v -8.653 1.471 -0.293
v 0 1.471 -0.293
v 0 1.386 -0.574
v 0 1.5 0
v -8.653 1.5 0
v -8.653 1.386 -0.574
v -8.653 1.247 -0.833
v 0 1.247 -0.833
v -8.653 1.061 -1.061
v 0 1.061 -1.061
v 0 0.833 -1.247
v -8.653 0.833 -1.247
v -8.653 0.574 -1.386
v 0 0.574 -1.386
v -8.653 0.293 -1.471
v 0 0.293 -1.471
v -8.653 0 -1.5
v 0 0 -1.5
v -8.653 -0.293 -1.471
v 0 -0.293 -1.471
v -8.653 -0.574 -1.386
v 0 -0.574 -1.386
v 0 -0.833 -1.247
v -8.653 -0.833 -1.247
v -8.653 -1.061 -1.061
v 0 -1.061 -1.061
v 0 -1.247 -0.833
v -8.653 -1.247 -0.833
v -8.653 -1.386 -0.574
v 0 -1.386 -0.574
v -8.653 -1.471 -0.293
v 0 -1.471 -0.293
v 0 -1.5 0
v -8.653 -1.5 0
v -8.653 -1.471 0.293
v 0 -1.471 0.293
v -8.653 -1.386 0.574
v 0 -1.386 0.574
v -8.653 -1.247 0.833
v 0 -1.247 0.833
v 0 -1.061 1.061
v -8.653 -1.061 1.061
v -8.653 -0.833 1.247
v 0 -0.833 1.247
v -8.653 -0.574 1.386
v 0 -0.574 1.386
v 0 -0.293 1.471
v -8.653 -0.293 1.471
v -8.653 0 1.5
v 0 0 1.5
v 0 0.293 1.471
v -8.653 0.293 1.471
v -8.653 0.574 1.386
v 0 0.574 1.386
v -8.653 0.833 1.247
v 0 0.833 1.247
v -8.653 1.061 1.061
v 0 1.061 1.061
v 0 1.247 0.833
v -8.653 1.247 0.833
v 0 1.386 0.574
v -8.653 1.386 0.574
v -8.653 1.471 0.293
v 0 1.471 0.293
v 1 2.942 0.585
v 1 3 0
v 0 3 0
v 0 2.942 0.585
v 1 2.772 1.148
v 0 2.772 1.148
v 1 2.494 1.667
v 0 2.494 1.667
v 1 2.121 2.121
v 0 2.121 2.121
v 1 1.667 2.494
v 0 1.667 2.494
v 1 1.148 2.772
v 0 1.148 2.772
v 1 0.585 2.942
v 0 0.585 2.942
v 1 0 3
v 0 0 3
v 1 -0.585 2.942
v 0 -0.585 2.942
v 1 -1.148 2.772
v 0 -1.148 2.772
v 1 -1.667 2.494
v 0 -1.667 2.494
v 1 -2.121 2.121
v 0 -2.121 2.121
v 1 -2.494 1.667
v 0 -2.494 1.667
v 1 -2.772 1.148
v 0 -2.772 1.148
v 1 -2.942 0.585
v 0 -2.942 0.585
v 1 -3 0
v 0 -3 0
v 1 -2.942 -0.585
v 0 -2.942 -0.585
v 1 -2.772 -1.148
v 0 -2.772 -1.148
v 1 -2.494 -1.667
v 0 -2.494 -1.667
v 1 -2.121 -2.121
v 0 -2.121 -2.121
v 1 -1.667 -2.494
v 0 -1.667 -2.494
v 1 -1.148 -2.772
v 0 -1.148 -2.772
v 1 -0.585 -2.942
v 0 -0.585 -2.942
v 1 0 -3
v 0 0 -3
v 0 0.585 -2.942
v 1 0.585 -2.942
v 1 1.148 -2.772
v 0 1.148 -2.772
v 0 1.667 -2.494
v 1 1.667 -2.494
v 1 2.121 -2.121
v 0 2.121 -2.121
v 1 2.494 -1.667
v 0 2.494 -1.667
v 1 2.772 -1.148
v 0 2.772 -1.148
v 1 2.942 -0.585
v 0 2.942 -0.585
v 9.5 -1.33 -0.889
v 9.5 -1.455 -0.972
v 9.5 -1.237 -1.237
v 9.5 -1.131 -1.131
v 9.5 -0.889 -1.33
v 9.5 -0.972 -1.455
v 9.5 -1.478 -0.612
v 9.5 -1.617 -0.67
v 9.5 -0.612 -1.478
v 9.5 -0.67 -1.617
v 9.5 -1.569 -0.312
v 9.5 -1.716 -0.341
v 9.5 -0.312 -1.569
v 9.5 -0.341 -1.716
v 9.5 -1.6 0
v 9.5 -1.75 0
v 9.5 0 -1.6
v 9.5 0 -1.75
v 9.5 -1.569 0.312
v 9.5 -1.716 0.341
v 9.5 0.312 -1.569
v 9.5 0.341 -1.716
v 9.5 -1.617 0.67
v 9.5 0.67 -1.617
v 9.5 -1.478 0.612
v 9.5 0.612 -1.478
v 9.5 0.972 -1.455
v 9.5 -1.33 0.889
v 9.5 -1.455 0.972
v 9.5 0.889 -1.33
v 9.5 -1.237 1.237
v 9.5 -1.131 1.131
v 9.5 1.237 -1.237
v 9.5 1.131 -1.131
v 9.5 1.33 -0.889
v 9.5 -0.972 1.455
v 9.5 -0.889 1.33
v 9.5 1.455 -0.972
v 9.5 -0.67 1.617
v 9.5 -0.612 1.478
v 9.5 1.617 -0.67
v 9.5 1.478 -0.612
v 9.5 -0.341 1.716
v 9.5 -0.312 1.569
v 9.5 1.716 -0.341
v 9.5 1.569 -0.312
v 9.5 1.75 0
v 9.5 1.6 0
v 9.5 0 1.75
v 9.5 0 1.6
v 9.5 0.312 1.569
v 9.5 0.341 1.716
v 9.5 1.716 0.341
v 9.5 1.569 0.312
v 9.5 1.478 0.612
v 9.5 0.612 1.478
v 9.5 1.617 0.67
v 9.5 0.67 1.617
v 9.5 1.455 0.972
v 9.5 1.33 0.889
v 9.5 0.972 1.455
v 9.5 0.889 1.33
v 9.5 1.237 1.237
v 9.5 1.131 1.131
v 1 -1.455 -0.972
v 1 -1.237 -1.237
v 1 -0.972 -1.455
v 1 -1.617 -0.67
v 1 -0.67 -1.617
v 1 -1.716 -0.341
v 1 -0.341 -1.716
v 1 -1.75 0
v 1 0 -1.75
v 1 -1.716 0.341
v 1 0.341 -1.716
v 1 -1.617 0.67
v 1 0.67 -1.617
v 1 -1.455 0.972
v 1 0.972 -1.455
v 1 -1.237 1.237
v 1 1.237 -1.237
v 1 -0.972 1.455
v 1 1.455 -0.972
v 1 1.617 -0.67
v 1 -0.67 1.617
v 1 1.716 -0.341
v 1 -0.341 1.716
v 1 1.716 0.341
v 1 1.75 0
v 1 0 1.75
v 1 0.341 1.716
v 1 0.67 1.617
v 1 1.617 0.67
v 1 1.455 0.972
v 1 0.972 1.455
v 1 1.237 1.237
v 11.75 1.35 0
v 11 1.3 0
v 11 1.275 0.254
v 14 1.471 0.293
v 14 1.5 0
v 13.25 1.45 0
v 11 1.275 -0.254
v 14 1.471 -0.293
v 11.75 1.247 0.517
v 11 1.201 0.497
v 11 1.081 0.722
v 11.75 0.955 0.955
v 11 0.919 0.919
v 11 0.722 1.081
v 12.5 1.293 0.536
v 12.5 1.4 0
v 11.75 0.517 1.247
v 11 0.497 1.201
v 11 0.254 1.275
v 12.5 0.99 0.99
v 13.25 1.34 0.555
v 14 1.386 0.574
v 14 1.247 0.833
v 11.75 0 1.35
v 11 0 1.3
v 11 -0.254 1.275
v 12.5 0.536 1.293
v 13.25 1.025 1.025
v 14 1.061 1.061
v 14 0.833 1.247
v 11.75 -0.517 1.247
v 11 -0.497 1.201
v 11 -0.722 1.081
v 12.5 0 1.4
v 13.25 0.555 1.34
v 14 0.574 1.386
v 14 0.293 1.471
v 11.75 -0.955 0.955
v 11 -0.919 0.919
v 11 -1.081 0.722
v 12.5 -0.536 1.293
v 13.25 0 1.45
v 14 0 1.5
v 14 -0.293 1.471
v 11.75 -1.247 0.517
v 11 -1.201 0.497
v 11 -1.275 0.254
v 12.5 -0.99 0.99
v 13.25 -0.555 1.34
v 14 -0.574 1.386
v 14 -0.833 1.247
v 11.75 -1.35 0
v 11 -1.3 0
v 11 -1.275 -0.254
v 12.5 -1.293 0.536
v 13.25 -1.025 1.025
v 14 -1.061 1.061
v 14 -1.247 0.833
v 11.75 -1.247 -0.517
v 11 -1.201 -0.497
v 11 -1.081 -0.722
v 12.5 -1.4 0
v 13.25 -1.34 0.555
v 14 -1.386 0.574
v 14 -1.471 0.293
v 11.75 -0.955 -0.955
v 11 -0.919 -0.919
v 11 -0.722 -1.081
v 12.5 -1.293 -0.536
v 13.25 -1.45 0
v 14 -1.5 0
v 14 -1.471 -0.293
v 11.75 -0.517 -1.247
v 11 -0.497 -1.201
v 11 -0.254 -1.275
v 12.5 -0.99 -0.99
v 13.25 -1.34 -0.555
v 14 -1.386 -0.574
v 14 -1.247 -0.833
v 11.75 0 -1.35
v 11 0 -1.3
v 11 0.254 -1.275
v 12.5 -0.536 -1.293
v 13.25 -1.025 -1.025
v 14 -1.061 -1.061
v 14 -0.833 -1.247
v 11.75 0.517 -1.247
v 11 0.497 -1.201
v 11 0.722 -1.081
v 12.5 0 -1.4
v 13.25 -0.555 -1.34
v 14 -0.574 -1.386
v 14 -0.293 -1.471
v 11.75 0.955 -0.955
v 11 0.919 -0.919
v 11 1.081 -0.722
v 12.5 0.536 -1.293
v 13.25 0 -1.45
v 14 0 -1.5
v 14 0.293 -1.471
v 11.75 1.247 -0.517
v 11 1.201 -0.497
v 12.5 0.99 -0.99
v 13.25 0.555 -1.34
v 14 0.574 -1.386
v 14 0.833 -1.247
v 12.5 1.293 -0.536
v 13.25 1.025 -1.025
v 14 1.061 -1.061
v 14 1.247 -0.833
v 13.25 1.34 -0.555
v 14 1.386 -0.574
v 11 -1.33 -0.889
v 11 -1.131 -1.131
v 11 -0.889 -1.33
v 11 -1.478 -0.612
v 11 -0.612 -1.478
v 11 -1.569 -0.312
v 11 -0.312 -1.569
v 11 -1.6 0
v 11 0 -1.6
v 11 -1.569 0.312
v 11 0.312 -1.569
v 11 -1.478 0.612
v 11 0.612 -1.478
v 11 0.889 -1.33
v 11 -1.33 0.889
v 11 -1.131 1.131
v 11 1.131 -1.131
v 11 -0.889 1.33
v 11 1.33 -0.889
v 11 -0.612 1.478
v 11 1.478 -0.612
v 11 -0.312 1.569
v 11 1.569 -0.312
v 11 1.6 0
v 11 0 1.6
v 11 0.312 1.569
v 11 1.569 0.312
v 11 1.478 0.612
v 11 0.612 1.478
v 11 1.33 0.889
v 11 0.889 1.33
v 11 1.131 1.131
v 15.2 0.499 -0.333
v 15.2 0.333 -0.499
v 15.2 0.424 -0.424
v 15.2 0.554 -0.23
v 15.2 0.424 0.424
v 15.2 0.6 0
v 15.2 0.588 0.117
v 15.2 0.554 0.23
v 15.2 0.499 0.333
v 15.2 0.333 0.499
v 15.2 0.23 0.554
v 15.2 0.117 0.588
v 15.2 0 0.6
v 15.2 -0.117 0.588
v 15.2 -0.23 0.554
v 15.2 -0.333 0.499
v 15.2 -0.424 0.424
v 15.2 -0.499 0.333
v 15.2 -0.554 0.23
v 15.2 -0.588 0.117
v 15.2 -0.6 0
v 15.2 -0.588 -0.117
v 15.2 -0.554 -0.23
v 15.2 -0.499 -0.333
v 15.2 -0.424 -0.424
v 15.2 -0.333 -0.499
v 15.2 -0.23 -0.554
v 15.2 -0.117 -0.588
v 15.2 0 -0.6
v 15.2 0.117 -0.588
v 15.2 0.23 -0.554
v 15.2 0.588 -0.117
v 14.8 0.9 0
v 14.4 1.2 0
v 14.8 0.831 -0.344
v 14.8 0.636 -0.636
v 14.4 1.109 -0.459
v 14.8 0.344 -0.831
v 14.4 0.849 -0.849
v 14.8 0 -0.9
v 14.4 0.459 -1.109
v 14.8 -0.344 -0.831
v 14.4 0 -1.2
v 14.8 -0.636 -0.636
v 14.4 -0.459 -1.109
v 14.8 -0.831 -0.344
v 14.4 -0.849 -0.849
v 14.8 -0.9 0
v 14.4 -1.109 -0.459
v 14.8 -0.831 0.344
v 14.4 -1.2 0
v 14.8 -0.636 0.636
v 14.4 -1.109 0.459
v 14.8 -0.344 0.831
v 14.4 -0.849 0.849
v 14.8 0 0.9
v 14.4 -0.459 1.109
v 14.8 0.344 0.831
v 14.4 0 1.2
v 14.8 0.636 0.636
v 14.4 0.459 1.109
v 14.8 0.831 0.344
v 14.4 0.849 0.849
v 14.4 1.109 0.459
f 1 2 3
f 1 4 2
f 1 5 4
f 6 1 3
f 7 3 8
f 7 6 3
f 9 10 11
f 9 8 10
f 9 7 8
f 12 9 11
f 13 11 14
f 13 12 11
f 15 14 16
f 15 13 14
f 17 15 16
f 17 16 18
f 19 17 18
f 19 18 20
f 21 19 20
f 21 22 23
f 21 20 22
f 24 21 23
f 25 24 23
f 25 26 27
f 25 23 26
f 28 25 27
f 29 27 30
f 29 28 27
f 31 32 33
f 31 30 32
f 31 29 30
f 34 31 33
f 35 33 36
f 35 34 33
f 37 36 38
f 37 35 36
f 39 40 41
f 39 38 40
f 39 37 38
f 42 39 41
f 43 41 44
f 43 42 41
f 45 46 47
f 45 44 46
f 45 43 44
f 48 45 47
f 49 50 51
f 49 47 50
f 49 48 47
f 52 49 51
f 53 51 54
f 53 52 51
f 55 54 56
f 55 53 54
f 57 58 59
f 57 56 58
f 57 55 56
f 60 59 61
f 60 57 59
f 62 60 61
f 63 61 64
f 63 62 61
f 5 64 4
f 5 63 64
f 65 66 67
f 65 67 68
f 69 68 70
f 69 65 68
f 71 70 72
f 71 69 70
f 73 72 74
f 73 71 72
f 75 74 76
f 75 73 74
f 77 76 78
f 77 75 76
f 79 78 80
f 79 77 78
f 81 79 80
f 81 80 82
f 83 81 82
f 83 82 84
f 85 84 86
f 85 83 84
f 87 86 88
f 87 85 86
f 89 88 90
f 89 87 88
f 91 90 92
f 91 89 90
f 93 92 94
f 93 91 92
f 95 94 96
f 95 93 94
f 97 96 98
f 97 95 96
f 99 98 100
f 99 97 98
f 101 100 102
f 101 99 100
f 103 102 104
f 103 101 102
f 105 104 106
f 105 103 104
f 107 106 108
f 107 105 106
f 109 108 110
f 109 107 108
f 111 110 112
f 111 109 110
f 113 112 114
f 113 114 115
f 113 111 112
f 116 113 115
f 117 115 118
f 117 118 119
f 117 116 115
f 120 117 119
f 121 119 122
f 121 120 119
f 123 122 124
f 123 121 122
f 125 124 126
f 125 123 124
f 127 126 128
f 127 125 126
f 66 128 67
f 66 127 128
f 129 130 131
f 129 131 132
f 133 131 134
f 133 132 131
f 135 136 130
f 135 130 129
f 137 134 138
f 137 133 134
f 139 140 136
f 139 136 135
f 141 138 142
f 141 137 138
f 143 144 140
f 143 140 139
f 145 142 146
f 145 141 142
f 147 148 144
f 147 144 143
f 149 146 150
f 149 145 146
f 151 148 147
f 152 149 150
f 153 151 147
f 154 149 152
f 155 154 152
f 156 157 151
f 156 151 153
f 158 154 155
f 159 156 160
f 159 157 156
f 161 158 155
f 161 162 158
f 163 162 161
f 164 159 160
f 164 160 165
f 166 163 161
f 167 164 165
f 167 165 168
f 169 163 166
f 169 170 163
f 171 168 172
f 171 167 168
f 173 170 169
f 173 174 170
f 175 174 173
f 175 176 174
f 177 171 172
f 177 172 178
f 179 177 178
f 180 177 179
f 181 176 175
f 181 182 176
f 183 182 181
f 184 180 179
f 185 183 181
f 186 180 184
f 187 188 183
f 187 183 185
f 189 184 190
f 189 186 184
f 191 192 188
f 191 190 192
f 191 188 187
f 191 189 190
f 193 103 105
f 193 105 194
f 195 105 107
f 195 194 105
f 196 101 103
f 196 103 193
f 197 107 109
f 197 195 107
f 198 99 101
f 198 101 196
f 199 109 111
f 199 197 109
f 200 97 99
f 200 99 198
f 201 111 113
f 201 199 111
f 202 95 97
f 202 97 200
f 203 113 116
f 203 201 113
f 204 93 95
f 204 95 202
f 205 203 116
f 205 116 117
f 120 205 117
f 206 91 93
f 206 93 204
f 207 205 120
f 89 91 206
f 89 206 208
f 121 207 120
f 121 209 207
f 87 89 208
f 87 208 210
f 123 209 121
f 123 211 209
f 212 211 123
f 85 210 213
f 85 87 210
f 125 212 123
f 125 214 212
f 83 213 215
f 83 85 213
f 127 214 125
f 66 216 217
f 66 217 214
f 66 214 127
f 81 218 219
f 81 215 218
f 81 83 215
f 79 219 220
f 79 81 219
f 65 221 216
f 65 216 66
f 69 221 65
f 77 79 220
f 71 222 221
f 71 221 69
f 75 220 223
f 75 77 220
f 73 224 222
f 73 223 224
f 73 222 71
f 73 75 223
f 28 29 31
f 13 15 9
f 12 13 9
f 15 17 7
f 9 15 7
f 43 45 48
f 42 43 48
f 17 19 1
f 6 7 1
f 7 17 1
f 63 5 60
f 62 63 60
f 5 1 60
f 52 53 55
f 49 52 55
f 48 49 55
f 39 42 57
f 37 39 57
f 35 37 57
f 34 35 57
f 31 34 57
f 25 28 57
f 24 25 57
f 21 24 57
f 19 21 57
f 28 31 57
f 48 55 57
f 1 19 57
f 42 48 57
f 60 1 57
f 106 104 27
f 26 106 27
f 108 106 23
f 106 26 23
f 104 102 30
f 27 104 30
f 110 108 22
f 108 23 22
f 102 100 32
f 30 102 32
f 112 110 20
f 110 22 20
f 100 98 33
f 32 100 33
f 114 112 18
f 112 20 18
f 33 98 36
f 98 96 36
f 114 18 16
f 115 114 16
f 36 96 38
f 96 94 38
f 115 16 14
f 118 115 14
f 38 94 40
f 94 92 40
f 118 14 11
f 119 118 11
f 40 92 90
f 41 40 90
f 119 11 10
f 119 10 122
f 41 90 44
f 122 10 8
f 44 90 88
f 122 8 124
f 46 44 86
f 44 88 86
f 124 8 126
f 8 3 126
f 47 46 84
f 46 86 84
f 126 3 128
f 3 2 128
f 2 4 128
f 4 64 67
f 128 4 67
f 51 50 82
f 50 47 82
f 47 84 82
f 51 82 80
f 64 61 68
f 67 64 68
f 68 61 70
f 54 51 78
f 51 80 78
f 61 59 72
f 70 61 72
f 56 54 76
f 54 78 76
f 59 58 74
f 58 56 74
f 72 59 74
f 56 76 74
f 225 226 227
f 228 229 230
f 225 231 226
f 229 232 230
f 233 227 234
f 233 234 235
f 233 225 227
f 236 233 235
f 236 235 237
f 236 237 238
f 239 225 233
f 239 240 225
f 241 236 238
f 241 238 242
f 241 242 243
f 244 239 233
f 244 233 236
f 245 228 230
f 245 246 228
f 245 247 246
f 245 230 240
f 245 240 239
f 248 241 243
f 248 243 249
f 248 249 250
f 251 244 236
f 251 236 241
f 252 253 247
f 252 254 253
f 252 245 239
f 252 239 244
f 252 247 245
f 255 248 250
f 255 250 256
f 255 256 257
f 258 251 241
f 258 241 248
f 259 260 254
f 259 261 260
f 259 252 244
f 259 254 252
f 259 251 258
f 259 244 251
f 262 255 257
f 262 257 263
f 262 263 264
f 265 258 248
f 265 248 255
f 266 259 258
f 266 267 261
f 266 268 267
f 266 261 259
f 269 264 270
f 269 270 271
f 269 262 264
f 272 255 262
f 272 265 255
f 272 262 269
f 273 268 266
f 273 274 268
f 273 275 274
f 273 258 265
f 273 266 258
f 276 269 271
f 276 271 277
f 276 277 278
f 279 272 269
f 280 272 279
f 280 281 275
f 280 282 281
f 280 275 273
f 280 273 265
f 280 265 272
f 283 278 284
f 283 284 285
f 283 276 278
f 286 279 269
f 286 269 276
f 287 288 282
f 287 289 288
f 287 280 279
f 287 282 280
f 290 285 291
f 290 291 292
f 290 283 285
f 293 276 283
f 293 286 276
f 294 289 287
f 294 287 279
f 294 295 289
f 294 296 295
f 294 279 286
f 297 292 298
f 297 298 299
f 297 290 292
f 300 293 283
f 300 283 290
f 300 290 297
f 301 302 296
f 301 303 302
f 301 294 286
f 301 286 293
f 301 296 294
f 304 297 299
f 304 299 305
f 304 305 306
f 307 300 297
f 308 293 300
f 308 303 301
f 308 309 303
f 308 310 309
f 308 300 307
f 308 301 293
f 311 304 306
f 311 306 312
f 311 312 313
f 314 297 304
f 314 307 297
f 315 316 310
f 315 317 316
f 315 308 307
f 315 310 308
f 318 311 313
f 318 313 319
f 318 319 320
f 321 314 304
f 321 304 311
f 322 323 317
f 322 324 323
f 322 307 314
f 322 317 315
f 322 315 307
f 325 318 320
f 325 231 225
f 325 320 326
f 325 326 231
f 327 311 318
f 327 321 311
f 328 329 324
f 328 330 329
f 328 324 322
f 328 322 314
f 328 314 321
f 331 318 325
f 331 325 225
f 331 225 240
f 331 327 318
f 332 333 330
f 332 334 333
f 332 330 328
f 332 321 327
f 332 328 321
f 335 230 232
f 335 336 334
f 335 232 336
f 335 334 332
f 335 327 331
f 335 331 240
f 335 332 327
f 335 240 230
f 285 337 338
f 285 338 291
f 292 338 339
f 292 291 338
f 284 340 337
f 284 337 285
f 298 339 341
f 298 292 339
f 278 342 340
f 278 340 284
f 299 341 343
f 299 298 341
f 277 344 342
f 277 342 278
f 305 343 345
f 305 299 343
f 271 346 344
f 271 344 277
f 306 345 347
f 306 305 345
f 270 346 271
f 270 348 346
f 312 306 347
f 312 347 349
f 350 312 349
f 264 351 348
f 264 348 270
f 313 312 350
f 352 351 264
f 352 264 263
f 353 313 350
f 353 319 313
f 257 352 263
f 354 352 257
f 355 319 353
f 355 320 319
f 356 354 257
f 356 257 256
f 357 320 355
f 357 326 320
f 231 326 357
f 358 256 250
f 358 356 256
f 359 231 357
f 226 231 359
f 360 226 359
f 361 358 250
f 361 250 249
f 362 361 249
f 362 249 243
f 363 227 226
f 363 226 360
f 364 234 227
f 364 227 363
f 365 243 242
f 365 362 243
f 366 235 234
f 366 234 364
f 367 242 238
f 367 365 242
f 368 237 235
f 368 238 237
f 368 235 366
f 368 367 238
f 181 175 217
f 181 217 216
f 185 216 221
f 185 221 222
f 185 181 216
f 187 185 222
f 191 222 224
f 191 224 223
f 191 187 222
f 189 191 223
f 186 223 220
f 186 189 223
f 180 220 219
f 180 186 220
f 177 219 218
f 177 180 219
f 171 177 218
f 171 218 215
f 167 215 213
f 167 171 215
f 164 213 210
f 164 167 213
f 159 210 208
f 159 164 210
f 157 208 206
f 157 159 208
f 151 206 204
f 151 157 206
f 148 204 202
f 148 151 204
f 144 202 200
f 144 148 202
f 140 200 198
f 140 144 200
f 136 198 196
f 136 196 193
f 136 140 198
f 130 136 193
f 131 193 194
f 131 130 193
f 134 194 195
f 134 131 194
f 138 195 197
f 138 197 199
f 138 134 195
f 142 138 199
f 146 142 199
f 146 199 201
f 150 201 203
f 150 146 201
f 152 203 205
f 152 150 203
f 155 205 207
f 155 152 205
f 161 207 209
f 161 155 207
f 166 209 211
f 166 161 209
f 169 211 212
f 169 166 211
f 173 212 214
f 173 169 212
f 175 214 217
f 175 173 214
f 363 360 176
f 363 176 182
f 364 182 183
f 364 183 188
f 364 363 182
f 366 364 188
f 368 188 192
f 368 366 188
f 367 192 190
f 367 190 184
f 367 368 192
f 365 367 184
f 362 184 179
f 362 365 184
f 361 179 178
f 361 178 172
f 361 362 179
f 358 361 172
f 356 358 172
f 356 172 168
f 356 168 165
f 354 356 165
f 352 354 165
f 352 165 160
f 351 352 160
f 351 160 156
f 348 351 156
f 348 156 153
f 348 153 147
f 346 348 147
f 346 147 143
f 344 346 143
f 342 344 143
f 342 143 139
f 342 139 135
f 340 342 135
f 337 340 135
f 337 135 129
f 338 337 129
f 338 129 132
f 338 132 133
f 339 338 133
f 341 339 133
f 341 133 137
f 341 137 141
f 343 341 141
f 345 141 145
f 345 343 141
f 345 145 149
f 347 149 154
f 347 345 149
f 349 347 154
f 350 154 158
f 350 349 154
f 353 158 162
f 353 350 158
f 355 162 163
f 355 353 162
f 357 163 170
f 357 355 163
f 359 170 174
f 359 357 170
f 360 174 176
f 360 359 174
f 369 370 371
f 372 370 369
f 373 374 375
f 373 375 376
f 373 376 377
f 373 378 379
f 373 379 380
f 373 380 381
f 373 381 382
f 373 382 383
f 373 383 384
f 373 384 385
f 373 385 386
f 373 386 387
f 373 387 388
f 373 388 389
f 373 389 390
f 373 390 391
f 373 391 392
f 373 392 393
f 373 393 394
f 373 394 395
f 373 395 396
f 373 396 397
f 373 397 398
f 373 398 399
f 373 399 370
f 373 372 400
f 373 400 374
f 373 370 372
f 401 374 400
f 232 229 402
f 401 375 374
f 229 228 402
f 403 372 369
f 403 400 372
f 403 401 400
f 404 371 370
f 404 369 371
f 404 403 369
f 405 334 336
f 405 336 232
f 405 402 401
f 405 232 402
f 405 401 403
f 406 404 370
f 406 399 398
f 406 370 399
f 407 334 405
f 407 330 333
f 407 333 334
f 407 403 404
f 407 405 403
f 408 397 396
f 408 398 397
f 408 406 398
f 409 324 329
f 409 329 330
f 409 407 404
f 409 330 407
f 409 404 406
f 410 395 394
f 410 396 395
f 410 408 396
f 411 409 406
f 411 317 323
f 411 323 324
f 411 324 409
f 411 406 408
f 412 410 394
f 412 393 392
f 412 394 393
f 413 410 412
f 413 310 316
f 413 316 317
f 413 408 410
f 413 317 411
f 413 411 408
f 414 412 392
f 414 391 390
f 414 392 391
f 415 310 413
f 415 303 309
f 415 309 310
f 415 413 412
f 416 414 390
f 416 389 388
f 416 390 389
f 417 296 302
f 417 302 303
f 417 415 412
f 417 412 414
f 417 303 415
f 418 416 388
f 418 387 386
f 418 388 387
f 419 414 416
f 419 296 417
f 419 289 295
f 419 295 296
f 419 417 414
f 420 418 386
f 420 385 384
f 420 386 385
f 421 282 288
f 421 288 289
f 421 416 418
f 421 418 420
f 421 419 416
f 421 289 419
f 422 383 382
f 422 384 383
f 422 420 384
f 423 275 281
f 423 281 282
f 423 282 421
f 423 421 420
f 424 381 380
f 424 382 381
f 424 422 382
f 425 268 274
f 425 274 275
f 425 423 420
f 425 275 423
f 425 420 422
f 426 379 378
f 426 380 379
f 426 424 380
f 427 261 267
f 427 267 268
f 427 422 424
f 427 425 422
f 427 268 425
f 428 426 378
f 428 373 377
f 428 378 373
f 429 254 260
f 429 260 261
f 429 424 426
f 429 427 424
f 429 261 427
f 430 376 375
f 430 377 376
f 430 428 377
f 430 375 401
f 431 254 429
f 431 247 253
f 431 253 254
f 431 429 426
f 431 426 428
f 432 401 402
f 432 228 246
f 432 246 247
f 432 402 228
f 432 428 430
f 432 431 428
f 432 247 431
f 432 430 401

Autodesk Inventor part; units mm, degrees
ref_plane "YZ Plane" through (0, 0, 0) normal (1, 0, 0) x (0, 1, 0)
ref_plane "XZ Plane" through (0, 0, 0) normal (0, 1, 0) x (-1, 0, 0)
ref_plane "XY Plane" through (0, 0, 0) normal (0, 0, 1) x (1, 0, 0)
sketch "Sketch1" plane through (0, 0, 0) normal (0, 0, 1) x (1, 0, 0)
  line L0 (0, 0) -> (0, 3)
  line L1 (0, 3) -> (1, 3)
  line L2 (1, 3) -> (1, 1.75)
  line L3 (0, 0) -> (14, 0)
  line L4 (1, 1.75) -> (9.5, 1.75)
  line L5 (9.5, 1.75) -> (9.5, 1.6)
  line L6 (9.5, 1.6) -> (11, 1.6)
  line L7 (11, 1.6) -> (11, 1.3)
  line L8 (11, 1.3) -> (14, 1.5)
  line L9 (14, 1.5) -> (15.2, 0.6)
  line L10 (15.2, 0.6) -> (15.2, 0)
  line L11 (0, 1.5) -> (-8.6528, 1.5)
  line L12 (-8.6528, 1.5) -> (-8.6528, 0)
  line L13 (0, 0) -> (-8.6528, 0)
  line L14 (14, 0) -> (15.2, 0)
  dimension "d1" = 1
  dimension "d3" = 14
  dimension "d5" = 6
  dimension "d6" = 3.5
  dimension "d7" = 3.2
  dimension "d8" = 2.6
  dimension "d9" = 3
  dimension "d11" = 14
  dimension "d12" = 11
  dimension "d13" = 9.5
  dimension "d15" = 1.2
  dimension "d16" = 1.2
  dimension "d17" = 8.6528
revolve "Revolution1" add sketch "Sketch1" angle 360 about axis through (0, 0, 0) along (1, 0, 0)
properties part number "3,5mm jack"
